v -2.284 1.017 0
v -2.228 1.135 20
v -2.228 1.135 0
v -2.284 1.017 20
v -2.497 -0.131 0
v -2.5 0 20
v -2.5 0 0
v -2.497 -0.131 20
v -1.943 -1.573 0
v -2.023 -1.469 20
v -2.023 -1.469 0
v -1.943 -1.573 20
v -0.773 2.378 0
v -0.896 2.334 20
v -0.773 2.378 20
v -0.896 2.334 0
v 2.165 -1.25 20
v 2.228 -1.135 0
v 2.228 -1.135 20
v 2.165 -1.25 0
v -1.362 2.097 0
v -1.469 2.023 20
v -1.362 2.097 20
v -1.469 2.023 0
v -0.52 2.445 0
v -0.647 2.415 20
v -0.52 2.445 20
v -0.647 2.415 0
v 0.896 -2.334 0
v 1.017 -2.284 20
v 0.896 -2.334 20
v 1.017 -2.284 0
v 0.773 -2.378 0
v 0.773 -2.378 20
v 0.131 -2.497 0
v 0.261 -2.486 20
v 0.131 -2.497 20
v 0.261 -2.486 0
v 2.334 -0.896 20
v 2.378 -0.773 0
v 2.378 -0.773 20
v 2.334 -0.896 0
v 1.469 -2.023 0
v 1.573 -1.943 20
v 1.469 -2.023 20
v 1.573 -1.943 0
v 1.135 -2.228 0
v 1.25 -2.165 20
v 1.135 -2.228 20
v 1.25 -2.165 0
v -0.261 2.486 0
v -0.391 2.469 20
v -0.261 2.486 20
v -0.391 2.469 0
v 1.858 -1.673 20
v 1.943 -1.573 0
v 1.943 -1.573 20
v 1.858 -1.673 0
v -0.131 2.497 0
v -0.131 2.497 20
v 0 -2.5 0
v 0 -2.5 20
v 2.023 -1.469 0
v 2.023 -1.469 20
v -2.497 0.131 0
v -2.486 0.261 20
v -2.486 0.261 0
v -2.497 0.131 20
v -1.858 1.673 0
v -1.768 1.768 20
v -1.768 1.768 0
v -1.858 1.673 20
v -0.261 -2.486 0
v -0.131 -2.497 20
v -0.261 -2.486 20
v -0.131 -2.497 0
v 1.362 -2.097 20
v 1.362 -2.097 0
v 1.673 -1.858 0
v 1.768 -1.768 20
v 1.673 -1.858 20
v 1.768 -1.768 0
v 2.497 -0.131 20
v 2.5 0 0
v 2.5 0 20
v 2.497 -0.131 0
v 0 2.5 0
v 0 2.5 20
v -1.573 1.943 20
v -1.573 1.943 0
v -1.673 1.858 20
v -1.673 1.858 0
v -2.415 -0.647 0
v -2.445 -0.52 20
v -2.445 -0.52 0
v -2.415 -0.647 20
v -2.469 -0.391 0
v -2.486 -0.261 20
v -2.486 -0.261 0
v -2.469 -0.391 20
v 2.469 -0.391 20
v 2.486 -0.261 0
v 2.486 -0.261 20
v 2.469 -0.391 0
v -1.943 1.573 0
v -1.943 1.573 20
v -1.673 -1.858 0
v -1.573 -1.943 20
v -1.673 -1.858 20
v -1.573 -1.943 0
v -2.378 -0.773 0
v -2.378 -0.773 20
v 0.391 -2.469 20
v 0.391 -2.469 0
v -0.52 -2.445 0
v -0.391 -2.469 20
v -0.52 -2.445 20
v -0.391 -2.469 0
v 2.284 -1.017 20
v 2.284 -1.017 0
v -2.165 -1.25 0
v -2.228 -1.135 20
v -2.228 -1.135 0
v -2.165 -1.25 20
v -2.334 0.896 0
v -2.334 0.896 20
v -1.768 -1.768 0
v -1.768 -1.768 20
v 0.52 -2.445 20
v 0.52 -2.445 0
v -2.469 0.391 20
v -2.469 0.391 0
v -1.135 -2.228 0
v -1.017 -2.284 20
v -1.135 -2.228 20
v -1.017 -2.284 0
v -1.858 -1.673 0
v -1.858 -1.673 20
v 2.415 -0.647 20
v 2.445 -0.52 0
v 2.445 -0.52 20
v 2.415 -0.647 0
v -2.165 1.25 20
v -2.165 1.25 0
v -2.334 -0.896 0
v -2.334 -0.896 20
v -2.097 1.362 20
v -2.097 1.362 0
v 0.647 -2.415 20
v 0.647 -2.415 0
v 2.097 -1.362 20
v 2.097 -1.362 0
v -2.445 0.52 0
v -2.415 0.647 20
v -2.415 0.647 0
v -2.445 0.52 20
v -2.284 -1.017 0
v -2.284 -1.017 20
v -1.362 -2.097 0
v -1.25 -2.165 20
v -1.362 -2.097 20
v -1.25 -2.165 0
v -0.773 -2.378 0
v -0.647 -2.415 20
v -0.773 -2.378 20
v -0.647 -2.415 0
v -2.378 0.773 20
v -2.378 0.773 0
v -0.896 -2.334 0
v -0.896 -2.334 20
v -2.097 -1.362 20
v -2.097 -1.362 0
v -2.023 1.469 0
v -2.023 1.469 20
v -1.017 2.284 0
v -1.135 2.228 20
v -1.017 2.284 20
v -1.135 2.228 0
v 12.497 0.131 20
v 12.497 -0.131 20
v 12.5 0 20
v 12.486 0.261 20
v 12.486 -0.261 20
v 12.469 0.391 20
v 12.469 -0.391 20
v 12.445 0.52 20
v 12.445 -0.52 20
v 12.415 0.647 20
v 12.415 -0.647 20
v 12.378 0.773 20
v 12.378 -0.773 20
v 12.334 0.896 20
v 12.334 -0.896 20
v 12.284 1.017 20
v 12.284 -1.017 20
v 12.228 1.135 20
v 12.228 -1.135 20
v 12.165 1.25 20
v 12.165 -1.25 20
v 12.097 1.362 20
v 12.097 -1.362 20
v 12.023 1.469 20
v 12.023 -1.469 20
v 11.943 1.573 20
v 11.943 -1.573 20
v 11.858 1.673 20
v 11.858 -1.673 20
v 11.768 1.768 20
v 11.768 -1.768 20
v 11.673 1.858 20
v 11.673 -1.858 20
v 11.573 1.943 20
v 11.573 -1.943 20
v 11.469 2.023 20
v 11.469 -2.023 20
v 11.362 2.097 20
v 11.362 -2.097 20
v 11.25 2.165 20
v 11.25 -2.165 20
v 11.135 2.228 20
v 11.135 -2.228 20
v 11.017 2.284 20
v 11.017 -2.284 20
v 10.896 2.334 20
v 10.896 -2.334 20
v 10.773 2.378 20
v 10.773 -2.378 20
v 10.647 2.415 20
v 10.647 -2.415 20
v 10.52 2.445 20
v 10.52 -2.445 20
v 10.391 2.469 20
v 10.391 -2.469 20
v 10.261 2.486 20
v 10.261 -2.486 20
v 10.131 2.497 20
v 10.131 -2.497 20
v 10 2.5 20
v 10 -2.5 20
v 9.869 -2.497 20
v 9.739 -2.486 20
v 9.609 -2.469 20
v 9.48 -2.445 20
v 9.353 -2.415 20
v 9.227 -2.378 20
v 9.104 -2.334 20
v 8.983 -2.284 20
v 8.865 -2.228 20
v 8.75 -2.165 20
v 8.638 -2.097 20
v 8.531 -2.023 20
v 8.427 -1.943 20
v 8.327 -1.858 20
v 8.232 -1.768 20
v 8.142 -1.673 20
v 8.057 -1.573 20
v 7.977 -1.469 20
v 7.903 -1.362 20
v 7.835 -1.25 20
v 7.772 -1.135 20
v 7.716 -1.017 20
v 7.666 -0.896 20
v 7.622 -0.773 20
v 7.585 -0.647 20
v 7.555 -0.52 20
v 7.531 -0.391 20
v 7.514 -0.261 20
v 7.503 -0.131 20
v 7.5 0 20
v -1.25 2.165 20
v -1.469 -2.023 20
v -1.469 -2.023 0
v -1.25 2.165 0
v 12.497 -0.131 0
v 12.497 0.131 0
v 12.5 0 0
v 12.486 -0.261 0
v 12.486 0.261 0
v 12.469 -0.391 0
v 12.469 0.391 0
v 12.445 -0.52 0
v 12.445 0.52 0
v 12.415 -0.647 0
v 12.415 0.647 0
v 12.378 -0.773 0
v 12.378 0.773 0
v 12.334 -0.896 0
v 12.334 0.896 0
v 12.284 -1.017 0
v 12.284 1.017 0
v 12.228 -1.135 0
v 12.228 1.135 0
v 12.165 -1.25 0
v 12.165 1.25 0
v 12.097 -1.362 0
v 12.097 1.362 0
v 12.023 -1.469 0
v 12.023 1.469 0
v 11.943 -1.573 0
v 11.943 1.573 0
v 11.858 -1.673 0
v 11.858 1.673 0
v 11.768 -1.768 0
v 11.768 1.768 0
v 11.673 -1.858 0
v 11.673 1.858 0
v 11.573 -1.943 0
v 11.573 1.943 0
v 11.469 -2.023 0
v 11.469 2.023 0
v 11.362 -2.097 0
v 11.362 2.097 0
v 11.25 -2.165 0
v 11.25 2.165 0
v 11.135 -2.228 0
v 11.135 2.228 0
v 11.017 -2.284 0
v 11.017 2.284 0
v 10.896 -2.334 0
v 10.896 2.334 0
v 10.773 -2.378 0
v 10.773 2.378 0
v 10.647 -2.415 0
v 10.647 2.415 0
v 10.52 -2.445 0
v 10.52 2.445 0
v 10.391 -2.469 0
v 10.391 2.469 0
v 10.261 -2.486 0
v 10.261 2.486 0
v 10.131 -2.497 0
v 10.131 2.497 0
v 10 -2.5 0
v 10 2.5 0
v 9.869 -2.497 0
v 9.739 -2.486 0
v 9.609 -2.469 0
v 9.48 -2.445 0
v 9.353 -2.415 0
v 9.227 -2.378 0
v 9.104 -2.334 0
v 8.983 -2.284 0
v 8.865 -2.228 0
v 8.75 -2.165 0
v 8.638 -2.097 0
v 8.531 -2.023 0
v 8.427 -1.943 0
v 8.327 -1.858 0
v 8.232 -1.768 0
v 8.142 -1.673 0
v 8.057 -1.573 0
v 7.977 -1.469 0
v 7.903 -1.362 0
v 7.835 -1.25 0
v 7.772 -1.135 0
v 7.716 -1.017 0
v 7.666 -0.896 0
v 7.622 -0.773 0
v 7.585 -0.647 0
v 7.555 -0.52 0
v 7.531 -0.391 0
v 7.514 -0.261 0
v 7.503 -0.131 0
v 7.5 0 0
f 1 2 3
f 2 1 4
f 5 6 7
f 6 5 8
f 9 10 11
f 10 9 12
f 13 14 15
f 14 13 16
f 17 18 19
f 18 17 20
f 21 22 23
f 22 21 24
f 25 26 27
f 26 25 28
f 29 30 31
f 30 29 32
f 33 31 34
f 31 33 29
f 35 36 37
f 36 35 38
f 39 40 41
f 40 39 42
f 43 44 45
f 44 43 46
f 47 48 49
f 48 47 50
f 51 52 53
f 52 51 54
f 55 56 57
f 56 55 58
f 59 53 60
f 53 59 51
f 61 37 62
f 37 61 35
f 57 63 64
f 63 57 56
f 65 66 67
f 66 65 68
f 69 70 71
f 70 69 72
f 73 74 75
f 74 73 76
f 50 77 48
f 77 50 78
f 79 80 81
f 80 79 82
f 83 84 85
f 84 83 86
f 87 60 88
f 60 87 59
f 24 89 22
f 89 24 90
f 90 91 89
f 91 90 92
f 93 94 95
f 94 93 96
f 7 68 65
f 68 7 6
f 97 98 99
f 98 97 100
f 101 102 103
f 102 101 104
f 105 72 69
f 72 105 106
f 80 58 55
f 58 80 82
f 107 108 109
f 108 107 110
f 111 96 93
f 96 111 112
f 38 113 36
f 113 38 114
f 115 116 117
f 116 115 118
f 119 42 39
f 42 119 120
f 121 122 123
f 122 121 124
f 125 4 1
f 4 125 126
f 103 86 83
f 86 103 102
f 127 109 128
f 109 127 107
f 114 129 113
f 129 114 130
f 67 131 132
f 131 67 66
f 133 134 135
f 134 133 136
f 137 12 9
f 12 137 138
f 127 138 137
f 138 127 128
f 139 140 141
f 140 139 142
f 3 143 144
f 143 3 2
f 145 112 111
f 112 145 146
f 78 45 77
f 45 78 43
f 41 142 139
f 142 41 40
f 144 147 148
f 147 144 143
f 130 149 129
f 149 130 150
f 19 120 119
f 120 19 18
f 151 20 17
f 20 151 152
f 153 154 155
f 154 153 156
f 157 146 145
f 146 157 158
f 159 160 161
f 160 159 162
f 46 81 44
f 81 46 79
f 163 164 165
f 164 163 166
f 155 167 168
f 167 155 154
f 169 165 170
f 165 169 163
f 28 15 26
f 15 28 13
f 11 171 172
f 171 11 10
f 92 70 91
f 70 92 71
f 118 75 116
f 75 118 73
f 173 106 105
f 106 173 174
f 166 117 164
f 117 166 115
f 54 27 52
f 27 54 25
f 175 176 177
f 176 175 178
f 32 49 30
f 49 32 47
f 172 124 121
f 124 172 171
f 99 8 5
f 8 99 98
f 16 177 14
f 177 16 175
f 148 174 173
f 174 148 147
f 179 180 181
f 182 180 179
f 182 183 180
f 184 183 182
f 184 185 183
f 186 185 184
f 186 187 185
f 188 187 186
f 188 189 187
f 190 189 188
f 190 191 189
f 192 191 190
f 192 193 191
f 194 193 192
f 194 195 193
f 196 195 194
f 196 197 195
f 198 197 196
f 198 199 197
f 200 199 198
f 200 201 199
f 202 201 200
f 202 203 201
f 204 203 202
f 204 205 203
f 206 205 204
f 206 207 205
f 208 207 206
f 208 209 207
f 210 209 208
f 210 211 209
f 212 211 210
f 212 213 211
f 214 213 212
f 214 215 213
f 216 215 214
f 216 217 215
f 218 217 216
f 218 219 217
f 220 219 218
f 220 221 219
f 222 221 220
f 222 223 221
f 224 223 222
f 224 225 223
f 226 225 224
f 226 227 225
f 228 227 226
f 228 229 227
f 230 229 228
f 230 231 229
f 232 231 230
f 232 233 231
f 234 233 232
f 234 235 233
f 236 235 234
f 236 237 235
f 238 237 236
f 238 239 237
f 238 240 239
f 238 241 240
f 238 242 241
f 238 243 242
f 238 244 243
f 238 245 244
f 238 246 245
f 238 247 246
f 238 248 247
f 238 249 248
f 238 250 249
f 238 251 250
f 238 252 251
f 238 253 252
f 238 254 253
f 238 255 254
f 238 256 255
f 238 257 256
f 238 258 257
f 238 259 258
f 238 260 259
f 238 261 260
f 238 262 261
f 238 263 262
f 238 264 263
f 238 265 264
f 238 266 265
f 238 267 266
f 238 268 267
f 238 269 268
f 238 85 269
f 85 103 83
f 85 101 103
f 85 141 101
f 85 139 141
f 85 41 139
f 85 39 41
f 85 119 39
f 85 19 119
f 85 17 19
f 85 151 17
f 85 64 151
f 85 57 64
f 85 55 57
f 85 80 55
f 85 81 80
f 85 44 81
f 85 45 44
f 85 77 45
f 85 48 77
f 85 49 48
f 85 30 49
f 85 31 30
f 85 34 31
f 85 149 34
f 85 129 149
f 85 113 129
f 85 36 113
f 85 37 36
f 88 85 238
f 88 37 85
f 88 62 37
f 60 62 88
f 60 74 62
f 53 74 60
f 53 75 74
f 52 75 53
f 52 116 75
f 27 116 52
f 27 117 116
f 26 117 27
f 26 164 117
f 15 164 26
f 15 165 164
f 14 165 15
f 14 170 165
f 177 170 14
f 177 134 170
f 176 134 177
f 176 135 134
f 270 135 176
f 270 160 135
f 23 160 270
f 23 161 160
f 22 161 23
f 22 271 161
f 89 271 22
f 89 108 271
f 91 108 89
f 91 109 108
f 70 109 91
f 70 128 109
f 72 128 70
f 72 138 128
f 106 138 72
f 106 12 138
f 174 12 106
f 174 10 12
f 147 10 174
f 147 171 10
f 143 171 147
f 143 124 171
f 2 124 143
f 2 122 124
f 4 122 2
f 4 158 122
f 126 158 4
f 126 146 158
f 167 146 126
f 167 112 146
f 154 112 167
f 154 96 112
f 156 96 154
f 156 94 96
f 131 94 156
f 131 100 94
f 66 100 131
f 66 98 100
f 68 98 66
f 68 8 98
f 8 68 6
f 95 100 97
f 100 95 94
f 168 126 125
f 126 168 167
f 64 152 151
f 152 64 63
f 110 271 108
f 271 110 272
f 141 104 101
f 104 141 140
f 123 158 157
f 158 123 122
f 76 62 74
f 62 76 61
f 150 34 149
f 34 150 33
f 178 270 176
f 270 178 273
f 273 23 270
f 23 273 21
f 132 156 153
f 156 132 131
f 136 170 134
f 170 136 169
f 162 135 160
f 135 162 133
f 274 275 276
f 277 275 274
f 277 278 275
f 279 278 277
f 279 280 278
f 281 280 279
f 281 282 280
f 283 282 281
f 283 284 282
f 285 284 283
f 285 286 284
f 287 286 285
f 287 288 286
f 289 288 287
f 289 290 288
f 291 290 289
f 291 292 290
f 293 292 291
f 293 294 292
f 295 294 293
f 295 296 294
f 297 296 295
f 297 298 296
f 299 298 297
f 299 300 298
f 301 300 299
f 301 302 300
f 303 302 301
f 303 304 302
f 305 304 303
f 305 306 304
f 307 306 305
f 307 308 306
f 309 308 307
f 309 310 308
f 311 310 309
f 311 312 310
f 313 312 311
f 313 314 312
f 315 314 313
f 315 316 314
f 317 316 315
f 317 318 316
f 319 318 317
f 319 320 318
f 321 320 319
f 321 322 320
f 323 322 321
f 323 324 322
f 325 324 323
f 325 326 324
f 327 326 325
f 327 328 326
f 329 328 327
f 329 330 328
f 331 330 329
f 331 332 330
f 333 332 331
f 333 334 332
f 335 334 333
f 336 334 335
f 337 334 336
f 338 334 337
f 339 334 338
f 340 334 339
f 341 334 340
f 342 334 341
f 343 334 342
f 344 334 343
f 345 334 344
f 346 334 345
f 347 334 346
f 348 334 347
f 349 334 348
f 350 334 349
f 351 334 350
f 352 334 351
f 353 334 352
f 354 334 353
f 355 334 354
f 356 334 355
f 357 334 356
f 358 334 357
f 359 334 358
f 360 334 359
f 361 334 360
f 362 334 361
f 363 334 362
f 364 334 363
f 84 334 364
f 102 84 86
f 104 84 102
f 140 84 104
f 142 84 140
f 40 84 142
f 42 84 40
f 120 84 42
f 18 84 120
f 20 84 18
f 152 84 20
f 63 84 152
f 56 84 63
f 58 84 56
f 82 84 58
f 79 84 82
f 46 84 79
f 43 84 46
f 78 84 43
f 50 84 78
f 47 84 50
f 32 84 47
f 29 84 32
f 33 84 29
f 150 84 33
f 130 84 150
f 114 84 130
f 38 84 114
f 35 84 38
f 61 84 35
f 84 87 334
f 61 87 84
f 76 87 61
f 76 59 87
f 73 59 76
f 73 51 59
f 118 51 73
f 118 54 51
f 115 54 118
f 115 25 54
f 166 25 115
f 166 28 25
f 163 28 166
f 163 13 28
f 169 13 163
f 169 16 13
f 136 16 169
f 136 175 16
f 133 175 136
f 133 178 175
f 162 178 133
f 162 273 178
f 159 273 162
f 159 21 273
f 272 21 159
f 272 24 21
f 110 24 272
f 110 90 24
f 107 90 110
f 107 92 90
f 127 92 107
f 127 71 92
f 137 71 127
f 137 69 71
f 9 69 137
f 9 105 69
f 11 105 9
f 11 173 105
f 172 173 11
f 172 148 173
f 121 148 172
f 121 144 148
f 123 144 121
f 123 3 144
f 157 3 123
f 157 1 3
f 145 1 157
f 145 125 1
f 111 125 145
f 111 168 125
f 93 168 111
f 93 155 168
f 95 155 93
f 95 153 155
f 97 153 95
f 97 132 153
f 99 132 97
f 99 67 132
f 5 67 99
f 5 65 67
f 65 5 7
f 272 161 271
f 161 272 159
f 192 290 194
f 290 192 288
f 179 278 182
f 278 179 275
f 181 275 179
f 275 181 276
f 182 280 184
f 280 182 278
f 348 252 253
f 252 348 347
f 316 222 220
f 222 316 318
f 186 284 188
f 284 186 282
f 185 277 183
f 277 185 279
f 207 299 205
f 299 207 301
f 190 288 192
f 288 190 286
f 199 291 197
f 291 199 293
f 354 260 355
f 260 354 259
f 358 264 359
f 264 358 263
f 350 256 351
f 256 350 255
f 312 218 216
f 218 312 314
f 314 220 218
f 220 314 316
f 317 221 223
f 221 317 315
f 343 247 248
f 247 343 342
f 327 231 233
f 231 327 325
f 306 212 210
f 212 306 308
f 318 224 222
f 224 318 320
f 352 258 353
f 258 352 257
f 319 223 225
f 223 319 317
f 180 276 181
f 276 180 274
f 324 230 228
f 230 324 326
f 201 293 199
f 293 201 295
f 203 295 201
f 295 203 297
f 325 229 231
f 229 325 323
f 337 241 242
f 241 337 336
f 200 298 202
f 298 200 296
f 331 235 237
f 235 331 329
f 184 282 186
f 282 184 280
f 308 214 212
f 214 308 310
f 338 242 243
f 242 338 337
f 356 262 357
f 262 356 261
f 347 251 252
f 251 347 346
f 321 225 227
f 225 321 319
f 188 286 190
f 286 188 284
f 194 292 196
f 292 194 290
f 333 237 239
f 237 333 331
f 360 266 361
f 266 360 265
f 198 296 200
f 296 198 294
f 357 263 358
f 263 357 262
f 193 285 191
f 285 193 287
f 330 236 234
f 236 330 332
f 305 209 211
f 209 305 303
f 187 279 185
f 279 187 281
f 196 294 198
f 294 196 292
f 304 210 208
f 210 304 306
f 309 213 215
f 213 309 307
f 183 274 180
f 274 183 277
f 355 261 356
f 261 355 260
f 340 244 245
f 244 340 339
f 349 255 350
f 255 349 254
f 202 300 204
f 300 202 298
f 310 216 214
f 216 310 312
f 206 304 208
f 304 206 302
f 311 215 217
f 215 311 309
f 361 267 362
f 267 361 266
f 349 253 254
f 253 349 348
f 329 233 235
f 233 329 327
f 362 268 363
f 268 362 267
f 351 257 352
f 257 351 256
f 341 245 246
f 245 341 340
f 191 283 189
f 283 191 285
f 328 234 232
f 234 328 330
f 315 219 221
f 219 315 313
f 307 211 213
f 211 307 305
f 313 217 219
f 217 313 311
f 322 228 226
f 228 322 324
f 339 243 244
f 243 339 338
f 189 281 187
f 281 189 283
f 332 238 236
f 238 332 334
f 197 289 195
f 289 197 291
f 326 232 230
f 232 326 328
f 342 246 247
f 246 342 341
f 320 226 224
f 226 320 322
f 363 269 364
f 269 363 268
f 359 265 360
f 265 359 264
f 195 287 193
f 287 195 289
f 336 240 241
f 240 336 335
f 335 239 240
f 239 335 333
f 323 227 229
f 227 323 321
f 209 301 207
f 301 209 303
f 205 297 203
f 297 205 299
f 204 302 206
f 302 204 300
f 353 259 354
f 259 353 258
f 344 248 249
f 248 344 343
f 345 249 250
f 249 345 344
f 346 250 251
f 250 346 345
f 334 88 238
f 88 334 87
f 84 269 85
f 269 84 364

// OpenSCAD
SupportBridge();

module SupportBridge() {

    size_x = 20;
    size_z = 10;
    size_y = 5;
    screws_diameter = 2;
    fn = 120;

    central_holder_ratio = 0.5;

    cylinder(h = size_x, d = size_y, $fn = fn);
    translate([size_z,0,0])
    cylinder(h = size_x, d = size_y, $fn = fn);
    cube([size_z, size_y * central_holder_ratio, size_x], center = false);

}
